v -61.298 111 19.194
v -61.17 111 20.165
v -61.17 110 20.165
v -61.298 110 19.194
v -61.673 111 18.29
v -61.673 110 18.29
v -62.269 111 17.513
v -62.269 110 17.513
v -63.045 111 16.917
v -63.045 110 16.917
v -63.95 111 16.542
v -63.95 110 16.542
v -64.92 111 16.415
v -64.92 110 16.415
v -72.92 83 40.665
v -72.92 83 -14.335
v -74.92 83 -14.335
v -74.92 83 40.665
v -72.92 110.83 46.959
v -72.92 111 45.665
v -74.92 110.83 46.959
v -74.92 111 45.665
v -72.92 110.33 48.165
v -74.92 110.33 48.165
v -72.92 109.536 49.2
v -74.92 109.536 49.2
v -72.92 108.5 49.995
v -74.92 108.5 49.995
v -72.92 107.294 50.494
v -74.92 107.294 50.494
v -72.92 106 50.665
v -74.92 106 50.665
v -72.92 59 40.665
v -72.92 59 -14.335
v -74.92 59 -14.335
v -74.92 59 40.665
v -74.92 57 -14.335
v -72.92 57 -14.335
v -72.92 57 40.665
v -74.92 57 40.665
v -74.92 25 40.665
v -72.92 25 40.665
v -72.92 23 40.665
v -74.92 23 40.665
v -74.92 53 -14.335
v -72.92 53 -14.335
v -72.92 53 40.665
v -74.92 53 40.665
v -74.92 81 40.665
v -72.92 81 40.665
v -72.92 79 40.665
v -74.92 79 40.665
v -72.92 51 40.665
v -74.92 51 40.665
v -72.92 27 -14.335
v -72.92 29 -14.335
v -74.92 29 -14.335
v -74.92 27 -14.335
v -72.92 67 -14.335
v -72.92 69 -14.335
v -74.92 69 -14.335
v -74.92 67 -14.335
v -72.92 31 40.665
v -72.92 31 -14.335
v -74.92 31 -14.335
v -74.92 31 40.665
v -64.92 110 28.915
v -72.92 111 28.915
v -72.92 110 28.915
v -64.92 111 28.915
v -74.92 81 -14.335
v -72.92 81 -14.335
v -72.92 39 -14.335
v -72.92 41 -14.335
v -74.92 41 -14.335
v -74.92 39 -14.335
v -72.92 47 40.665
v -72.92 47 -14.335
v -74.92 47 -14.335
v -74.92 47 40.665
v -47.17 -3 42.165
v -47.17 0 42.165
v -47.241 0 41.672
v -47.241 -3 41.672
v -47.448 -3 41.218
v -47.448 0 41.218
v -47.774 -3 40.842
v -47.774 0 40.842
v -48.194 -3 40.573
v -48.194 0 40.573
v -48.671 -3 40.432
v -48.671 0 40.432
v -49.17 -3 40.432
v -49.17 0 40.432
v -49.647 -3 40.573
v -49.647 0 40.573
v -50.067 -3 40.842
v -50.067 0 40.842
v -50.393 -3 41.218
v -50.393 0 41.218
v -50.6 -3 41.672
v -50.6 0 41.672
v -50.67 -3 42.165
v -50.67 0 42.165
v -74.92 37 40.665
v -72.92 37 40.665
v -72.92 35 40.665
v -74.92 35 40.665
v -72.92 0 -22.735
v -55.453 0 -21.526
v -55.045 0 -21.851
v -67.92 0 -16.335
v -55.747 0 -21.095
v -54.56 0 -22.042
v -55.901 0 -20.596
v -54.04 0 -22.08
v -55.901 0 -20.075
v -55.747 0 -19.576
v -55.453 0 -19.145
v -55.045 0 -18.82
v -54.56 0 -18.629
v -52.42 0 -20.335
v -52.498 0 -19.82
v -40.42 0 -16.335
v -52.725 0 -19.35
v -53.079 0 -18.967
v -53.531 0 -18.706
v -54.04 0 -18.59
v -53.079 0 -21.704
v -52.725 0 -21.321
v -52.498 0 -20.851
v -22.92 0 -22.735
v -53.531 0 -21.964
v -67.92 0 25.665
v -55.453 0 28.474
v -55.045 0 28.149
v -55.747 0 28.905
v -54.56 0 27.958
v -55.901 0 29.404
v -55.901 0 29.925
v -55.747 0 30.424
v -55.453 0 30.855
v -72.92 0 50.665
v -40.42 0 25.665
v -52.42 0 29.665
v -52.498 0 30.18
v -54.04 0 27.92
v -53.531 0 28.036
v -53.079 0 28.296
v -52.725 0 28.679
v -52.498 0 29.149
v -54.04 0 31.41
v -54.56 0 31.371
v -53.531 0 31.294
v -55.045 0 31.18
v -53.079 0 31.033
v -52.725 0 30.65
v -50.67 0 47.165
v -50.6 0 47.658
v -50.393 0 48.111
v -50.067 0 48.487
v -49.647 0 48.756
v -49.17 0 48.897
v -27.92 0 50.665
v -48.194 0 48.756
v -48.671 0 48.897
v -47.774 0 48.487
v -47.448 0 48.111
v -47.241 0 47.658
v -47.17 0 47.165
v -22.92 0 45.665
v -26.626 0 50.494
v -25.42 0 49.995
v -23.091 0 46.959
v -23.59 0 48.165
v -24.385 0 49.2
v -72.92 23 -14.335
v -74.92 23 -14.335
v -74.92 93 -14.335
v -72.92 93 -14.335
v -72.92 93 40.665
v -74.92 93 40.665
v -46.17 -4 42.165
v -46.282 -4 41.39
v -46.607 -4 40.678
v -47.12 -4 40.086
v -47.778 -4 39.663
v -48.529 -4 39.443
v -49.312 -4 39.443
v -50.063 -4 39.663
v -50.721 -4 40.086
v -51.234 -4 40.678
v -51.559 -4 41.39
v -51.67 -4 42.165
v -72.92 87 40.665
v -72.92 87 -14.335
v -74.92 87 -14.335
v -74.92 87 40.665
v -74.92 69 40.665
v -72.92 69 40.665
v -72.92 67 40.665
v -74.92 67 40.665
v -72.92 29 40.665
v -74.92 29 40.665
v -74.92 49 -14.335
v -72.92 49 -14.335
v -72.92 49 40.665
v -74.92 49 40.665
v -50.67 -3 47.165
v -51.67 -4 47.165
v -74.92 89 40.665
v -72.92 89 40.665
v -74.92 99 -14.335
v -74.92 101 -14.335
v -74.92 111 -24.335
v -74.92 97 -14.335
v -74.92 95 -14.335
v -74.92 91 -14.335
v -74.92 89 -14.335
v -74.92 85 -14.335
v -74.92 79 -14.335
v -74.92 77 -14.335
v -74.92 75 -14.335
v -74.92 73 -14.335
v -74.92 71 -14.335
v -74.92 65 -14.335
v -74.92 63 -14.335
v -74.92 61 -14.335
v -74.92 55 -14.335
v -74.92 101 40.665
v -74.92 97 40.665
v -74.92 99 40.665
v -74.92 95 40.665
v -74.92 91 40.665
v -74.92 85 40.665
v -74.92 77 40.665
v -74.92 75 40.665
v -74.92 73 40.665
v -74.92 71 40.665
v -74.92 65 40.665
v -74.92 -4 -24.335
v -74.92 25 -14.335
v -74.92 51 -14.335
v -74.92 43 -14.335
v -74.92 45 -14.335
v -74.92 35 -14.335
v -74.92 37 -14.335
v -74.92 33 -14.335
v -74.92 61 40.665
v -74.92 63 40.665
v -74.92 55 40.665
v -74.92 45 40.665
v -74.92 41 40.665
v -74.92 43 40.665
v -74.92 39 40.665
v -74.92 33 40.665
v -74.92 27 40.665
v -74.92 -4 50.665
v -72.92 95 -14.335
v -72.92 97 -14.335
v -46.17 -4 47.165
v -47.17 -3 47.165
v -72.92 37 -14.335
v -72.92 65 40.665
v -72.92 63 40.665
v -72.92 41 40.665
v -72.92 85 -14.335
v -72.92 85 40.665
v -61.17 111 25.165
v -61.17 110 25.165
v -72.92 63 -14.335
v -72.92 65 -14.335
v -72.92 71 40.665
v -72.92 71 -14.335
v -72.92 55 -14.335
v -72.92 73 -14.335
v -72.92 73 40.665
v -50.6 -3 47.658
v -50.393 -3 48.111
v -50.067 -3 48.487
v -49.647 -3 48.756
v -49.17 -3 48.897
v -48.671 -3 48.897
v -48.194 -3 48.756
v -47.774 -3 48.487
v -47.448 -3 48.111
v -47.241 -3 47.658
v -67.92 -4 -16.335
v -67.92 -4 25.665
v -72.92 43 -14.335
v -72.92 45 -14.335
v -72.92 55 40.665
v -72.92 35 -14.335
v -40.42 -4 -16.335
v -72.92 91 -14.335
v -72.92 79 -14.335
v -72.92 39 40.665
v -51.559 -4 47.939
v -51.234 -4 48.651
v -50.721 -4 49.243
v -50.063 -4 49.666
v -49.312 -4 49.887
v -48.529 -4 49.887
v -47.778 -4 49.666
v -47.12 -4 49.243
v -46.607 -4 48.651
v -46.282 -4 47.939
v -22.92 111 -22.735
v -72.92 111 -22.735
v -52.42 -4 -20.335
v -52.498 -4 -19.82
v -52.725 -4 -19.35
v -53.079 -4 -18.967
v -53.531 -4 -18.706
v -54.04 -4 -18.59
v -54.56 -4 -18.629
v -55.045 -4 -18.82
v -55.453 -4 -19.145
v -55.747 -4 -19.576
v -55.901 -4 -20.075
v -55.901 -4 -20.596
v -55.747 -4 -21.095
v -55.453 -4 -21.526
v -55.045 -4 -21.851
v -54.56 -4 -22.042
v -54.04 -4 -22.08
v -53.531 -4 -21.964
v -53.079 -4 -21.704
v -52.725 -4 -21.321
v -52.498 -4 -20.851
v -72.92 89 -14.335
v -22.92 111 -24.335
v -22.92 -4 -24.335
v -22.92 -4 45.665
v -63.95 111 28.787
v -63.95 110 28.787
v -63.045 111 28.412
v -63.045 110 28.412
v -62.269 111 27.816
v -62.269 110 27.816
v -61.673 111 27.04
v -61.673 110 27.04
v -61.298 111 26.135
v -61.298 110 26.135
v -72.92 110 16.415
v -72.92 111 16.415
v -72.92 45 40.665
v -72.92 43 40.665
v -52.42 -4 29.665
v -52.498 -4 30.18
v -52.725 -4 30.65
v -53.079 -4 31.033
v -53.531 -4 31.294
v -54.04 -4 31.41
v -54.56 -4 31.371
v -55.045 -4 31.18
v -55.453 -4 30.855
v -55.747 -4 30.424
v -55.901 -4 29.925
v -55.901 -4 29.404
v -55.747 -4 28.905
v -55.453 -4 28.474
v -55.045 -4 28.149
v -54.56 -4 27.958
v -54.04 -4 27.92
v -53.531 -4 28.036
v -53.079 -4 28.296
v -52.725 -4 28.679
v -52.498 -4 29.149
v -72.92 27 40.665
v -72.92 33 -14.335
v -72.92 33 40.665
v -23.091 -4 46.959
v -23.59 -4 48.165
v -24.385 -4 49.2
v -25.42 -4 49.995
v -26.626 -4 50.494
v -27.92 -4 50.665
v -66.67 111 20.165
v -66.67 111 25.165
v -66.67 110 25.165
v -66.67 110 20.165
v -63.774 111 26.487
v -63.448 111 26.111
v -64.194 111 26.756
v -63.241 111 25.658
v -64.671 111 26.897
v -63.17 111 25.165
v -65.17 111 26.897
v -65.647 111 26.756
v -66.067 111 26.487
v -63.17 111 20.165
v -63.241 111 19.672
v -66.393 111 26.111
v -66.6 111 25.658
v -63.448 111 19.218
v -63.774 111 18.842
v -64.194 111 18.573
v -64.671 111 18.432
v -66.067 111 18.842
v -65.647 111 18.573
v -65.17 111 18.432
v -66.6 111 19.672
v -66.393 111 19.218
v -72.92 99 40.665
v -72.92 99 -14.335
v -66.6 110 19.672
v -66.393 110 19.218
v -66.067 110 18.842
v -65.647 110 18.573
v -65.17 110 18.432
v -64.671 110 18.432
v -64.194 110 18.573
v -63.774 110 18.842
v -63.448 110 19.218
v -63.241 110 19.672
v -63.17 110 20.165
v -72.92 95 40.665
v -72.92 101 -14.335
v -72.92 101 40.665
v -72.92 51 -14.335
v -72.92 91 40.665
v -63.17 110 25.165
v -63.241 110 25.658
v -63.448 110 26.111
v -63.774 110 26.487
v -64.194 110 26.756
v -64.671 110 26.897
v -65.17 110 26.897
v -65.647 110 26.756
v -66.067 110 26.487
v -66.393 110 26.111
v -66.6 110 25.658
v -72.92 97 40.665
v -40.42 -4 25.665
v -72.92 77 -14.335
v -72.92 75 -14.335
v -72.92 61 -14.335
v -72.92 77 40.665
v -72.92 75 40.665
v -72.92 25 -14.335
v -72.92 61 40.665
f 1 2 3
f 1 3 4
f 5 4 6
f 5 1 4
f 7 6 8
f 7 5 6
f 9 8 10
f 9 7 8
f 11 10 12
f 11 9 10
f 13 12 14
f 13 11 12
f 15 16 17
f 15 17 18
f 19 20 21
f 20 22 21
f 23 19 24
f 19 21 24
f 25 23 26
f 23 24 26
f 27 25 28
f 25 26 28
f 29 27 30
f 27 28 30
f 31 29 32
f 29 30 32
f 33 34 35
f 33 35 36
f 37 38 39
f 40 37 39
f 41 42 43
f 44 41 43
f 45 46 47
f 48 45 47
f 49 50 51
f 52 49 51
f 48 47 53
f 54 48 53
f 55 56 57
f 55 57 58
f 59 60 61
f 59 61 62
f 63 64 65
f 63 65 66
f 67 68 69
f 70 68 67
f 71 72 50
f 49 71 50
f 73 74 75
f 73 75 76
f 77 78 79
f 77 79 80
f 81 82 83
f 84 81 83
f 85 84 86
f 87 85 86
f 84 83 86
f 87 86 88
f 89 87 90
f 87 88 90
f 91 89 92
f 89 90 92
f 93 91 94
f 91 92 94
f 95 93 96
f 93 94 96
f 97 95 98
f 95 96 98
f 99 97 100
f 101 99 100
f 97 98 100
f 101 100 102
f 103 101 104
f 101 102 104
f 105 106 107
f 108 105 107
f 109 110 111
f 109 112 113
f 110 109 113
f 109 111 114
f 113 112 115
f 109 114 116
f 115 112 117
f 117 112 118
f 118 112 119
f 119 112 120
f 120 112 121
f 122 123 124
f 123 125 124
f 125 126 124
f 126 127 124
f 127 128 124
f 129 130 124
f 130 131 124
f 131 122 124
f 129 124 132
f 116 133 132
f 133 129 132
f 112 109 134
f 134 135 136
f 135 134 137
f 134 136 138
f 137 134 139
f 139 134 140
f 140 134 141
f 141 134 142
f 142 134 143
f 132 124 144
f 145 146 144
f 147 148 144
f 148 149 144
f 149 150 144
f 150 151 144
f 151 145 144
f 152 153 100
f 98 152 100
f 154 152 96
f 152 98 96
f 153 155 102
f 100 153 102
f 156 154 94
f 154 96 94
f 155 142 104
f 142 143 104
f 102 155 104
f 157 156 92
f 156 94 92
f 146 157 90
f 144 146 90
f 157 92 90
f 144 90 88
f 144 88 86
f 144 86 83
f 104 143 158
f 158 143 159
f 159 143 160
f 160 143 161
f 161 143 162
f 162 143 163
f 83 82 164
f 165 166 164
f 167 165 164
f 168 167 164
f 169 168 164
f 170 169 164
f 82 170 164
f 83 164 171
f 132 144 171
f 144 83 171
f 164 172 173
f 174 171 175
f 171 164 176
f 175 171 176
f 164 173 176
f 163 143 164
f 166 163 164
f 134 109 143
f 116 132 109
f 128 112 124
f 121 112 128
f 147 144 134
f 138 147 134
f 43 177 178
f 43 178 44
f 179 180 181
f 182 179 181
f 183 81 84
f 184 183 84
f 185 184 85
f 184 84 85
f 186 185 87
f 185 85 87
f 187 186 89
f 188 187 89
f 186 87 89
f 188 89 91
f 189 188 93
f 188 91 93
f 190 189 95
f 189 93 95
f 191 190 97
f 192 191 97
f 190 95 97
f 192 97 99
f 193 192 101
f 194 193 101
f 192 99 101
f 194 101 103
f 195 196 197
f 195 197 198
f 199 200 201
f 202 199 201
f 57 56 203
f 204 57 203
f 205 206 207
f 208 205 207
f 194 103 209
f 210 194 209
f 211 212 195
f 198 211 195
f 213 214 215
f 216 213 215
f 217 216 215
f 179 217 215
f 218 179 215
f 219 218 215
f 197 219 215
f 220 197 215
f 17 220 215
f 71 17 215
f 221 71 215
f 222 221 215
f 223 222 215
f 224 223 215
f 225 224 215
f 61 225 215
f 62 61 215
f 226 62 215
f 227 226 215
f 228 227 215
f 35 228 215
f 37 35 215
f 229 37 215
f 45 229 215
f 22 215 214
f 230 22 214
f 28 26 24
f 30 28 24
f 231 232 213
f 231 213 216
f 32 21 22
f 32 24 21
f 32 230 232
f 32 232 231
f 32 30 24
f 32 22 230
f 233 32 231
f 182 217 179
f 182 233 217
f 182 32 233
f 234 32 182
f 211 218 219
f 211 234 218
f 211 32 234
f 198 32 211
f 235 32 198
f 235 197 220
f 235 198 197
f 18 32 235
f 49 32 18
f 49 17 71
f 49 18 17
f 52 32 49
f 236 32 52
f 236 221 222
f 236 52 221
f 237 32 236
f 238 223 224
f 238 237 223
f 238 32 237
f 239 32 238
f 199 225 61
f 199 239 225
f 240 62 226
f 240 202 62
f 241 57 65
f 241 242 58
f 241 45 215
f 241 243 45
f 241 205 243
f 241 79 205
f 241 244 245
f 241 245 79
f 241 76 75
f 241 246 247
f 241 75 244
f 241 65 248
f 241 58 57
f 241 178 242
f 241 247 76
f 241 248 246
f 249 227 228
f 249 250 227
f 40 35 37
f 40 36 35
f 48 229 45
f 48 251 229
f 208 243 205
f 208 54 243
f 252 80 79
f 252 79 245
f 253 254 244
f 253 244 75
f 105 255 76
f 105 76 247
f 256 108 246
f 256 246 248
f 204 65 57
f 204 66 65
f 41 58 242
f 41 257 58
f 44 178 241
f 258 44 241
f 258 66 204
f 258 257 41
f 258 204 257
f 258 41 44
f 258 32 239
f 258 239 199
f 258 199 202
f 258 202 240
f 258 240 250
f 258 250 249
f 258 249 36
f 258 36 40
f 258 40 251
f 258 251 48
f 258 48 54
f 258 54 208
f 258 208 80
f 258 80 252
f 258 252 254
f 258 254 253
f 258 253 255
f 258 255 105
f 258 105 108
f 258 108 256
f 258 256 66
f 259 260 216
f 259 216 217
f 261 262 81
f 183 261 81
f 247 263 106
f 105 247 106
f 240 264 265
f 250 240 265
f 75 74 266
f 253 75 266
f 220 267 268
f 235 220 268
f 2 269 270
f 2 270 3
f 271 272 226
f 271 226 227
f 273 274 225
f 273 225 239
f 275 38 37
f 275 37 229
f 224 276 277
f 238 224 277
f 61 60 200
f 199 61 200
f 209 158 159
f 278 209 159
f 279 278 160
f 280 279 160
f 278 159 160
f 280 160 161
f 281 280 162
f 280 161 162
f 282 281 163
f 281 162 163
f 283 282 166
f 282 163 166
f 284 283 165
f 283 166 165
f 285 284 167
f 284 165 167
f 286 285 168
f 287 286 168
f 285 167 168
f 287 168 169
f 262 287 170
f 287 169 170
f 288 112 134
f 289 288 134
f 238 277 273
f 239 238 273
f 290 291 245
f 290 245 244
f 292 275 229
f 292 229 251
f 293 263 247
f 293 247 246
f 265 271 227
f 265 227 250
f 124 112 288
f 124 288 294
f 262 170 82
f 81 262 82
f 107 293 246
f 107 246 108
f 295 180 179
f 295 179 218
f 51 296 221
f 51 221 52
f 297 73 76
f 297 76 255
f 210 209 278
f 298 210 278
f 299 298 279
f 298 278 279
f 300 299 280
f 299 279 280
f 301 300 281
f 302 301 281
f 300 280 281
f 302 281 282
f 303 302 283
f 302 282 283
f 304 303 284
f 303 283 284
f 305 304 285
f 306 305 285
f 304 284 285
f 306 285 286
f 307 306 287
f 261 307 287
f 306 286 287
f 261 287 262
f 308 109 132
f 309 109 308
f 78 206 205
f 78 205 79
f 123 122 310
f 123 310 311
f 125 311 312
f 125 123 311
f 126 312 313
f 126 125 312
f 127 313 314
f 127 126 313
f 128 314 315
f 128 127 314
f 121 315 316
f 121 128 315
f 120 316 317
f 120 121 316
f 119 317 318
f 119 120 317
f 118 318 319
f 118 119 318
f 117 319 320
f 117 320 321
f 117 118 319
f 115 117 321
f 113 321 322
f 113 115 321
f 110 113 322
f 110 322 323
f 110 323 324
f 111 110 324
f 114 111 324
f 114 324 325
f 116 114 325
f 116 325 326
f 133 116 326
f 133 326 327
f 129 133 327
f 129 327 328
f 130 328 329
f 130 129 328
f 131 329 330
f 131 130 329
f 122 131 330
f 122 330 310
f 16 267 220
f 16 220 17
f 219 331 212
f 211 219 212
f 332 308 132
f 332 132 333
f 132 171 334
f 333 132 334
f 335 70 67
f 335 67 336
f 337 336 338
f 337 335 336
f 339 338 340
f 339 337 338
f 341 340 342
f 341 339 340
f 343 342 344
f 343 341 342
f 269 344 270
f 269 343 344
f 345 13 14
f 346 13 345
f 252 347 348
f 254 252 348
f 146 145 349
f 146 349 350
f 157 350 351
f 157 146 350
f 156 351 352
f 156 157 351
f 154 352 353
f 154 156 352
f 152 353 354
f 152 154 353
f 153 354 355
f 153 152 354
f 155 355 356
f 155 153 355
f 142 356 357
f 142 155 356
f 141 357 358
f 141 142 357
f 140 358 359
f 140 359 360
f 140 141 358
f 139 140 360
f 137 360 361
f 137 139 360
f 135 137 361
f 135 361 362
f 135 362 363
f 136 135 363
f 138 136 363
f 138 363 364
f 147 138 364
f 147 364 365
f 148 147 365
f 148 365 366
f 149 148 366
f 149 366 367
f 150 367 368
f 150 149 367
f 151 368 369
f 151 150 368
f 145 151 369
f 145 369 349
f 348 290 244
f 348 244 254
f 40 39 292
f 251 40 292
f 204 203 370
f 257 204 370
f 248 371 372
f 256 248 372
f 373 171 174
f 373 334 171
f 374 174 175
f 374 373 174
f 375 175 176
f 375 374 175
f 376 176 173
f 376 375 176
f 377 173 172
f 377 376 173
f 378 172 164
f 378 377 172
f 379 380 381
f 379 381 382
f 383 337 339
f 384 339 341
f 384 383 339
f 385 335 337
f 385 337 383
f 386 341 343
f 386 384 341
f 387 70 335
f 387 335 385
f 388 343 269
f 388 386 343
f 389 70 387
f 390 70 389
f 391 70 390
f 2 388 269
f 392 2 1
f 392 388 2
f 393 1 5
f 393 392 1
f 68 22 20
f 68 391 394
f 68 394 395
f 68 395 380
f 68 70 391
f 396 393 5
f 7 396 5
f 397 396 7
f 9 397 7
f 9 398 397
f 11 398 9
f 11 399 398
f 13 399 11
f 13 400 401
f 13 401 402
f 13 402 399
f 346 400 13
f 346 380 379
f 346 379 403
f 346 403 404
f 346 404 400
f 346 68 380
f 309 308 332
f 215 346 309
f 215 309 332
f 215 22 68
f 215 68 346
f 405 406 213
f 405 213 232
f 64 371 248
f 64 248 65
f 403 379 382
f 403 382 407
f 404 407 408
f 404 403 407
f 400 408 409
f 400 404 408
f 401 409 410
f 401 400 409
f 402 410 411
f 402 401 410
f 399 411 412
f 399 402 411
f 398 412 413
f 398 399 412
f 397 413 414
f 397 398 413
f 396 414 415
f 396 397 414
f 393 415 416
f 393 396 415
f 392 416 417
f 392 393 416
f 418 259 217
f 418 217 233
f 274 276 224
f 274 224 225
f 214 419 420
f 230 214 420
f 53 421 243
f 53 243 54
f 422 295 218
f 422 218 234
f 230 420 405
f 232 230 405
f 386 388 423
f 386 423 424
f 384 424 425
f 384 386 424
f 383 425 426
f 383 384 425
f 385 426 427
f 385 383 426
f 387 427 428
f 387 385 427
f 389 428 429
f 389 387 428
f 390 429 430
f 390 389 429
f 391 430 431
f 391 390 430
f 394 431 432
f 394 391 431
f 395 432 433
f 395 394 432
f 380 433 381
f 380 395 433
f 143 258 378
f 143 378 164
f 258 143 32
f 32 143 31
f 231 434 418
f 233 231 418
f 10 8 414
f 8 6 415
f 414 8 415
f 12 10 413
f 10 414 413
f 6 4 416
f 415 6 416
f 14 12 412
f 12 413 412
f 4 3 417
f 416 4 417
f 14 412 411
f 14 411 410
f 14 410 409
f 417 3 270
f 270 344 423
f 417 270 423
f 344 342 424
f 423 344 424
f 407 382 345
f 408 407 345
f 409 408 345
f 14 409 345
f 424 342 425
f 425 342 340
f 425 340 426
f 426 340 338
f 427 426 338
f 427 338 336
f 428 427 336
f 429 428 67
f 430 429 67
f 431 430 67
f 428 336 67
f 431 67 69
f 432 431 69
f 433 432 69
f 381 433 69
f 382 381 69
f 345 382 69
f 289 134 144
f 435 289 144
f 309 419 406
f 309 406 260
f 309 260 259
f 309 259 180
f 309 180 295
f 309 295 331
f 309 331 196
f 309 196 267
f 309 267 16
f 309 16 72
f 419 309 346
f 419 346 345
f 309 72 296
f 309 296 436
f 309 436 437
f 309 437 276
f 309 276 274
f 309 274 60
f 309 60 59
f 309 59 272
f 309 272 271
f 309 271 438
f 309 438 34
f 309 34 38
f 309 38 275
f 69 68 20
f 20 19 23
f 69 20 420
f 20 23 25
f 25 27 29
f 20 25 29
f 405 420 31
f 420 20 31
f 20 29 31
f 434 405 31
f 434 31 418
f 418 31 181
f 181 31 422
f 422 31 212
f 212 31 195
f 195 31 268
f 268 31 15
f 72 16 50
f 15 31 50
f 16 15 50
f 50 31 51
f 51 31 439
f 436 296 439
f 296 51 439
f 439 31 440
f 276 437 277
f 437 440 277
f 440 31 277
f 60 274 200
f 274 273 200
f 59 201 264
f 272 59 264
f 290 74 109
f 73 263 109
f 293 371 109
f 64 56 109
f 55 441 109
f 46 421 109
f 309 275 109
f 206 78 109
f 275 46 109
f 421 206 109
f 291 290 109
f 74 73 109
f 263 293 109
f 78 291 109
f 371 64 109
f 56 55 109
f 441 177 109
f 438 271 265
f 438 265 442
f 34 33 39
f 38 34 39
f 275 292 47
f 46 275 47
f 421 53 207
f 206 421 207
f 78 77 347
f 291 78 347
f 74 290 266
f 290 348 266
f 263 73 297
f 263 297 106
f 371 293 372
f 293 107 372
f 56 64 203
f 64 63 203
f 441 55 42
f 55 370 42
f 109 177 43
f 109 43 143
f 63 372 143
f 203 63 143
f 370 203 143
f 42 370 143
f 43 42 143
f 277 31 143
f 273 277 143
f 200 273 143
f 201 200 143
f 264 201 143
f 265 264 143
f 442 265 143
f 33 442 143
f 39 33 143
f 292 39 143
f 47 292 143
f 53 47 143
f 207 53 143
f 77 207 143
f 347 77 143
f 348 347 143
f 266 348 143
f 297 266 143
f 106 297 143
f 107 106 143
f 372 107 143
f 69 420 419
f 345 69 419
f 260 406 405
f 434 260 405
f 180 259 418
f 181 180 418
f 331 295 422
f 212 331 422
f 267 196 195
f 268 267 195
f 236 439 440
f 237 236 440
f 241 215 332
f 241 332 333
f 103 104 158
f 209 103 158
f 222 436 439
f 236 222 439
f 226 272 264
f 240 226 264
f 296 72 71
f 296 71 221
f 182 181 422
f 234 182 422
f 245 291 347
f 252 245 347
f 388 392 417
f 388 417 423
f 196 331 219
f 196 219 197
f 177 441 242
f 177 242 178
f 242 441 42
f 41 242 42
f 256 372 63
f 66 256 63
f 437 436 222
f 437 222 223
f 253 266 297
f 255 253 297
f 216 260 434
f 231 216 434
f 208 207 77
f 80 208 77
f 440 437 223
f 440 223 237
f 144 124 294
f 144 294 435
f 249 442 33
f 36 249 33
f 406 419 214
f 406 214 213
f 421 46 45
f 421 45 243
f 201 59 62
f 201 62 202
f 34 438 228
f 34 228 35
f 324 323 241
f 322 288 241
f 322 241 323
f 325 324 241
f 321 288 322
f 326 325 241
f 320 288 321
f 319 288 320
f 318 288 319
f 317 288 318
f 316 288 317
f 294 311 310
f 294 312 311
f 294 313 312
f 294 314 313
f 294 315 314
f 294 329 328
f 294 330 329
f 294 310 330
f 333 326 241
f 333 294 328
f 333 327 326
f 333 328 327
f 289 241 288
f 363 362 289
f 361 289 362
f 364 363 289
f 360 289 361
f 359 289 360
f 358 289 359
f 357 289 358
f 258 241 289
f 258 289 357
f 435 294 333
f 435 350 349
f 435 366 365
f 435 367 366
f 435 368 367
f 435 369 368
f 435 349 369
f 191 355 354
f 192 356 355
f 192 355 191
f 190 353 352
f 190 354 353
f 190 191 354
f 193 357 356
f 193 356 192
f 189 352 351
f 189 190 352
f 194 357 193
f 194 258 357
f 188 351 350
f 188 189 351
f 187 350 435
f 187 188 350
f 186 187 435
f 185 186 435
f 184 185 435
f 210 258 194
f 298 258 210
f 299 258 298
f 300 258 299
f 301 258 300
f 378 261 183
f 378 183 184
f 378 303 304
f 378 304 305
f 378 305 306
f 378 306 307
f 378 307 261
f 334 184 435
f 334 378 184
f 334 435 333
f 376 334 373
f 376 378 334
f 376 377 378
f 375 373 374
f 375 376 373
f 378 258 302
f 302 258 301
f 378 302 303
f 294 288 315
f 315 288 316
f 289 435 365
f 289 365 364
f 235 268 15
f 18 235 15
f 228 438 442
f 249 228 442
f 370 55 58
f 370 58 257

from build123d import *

# Parameters (mm, degrees)
F0_R     = 1.75
F0_W     = 27.5
F0_H     = 42
F1_DEPTH = 4
F3_W     = 110
F3_H     = 73.4
F3_W_2   = 2
F3_H_2   = 55
F3_W_3   = 1
F4_DEPTH = 2
F5_SIZE  = 1
F6_DEPTH = 50
F9_DEPTH = 1
F10_R    = 5


# Not quite as in the source:
# - a feature names something its author has since deleted; it is built from what else it names


with BuildPart() as f1:
    # F0 (on Front) → F1 (new body)
    with BuildSketch(Plane.XZ):
        Polygon((-22.9204972982, 50.6646189876), (-72.9204972982, 50.6646189876), (-74.9204972982, 50.6646189876), (-74.9204972982, -24.3353810124), (-72.9204972982, -24.3353810124), (-22.9204972982, -24.3353810124), align=None)
        with Locations((-54.1704972982, -20.3353810124)):
            Circle(F0_R, mode=Mode.SUBTRACT)
        with Locations((-54.1704972982, 4.6646189876)):
            Rectangle(F0_W, F0_H, mode=Mode.SUBTRACT)
        with Locations((-54.1704972982, 29.6646189876)):
            Circle(F0_R, mode=Mode.SUBTRACT)
        with BuildLine():
            Line((-50.6704972982, 42.1646189876), (-50.6704972982, 47.1646189876))
            ThreePointArc((-50.6704972982, 47.1646189876), (-48.9204972982, 48.9146189876), (-47.1704972982, 47.1646189876))
            Line((-47.1704972982, 47.1646189876), (-47.1704972982, 42.1646189876))
            ThreePointArc((-47.1704972982, 42.1646189876), (-48.9204972982, 40.4146189876), (-50.6704972982, 42.1646189876))
        make_face(mode=Mode.SUBTRACT)
    extrude(amount=F1_DEPTH)

    # F3 (on line) → F4 (join, through all)
    with BuildSketch(Plane(origin=(-72.9204972982, 0, 0), x_dir=(0, -1, 0), z_dir=(-1, 0, 0))):
        with Locations((-55, 13.9646189876)):
            Rectangle(F3_W, F3_H)
        with Locations((-100, 13.1646189876)):
            Rectangle(F3_W_2, F3_H_2, mode=Mode.SUBTRACT)
        with Locations((-96, 13.1646189876)):
            Rectangle(F3_W_2, F3_H_2, mode=Mode.SUBTRACT)
        with Locations((-92, 13.1646189876)):
            Rectangle(F3_W_2, F3_H_2, mode=Mode.SUBTRACT)
        with Locations((-88, 13.1646189876)):
            Rectangle(F3_W_2, F3_H_2, mode=Mode.SUBTRACT)
        with Locations((-84, 13.1646189876)):
            Rectangle(F3_W_2, F3_H_2, mode=Mode.SUBTRACT)
        with Locations((-80, 13.1646189876)):
            Rectangle(F3_W_2, F3_H_2, mode=Mode.SUBTRACT)
        with Locations((-76, 13.1646189876)):
            Rectangle(F3_W_2, F3_H_2, mode=Mode.SUBTRACT)
        with Locations((-72, 13.1646189876)):
            Rectangle(F3_W_2, F3_H_2, mode=Mode.SUBTRACT)
        with Locations((-68, 13.1646189876)):
            Rectangle(F3_W_2, F3_H_2, mode=Mode.SUBTRACT)
        with Locations((-64, 13.1646189876)):
            Rectangle(F3_W_2, F3_H_2, mode=Mode.SUBTRACT)
        with Locations((-60, 13.1646189876)):
            Rectangle(F3_W_2, F3_H_2, mode=Mode.SUBTRACT)
        with Locations((-56, 13.1646189876)):
            Rectangle(F3_W_2, F3_H_2, mode=Mode.SUBTRACT)
        with Locations((-52, 13.1646189876)):
            Rectangle(F3_W_2, F3_H_2, mode=Mode.SUBTRACT)
        with Locations((-48, 13.1646189876)):
            Rectangle(F3_W_2, F3_H_2, mode=Mode.SUBTRACT)
        with Locations((-44, 13.1646189876)):
            Rectangle(F3_W_2, F3_H_2, mode=Mode.SUBTRACT)
        with Locations((-40, 13.1646189876)):
            Rectangle(F3_W_2, F3_H_2, mode=Mode.SUBTRACT)
        with Locations((-36, 13.1646189876)):
            Rectangle(F3_W_2, F3_H_2, mode=Mode.SUBTRACT)
        with Locations((-32, 13.1646189876)):
            Rectangle(F3_W_2, F3_H_2, mode=Mode.SUBTRACT)
        with Locations((-28, 13.1646189876)):
            Rectangle(F3_W_2, F3_H_2, mode=Mode.SUBTRACT)
        with Locations((-24, 13.1646189876)):
            Rectangle(F3_W_2, F3_H_2, mode=Mode.SUBTRACT)
        with Locations((-110.5, 13.9646189876)):
            Rectangle(F3_W_3, F3_H)
        Polygon((0, -24.3353810124), (0, -22.7353810124), (-110, -22.7353810124), (-111, -22.7353810124), (-111, -24.3353810124), align=None)
    extrude(amount=F4_DEPTH)

    # F5
    f5_edges = [f1.edges().sort_by_distance(p)[0] for p in [
        (-47.170497, -4, 44.664619),
    ]]
    chamfer(f5_edges, length=F5_SIZE)

    # F3 (on line) → F6 (join, through all)
    with BuildSketch(Plane(origin=(-72.9204972982, 0, 0), x_dir=(0, -1, 0), z_dir=(-1, 0, 0))):
        Polygon((0, -24.3353810124), (0, -22.7353810124), (-110, -22.7353810124), (-111, -22.7353810124), (-111, -24.3353810124), align=None)
    extrude(amount=-F6_DEPTH)

    # F8 (on line) → F9 (join, through all)
    with BuildSketch(Plane(origin=(0, 111, 0), x_dir=(-1, 0, 0), z_dir=(0, 1, 0))):
        with BuildLine():
            Line((64.9204972982, 16.4146189876), (72.9204972982, 16.4146189876))
            Line((72.9204972982, 16.4146189876), (72.9204972982, 28.9146189876))
            Line((72.9204972982, 28.9146189876), (64.9204972982, 28.9146189876))
            ThreePointArc((64.9204972982, 28.9146189876), (62.2688468688, 27.816269417), (61.1704972982, 25.1646189876))
            Line((61.1704972982, 25.1646189876), (61.1704972982, 20.1646189876))
            ThreePointArc((61.1704972982, 20.1646189876), (62.2688468688, 17.5129685581), (64.9204972982, 16.4146189876))
        make_face()
        with BuildLine():
            Line((63.1704972982, 20.1646189876), (63.1704972982, 25.1646189876))
            ThreePointArc((63.1704972982, 25.1646189876), (64.9204972982, 26.9146189876), (66.6704972982, 25.1646189876))
            Line((66.6704972982, 25.1646189876), (66.6704972982, 20.1646189876))
            ThreePointArc((66.6704972982, 20.1646189876), (64.9204972982, 18.4146189876), (63.1704972982, 20.1646189876))
        make_face(mode=Mode.SUBTRACT)
    extrude(amount=-F9_DEPTH)

    # F10
    f10_edges = [f1.edges().sort_by_distance(p)[0] for p in [
        (-22.920497, -2, 50.664619),
        (-73.920497, 111, 50.664619),
    ]]
    fillet(f10_edges, radius=F10_R)


solid = f1.part
